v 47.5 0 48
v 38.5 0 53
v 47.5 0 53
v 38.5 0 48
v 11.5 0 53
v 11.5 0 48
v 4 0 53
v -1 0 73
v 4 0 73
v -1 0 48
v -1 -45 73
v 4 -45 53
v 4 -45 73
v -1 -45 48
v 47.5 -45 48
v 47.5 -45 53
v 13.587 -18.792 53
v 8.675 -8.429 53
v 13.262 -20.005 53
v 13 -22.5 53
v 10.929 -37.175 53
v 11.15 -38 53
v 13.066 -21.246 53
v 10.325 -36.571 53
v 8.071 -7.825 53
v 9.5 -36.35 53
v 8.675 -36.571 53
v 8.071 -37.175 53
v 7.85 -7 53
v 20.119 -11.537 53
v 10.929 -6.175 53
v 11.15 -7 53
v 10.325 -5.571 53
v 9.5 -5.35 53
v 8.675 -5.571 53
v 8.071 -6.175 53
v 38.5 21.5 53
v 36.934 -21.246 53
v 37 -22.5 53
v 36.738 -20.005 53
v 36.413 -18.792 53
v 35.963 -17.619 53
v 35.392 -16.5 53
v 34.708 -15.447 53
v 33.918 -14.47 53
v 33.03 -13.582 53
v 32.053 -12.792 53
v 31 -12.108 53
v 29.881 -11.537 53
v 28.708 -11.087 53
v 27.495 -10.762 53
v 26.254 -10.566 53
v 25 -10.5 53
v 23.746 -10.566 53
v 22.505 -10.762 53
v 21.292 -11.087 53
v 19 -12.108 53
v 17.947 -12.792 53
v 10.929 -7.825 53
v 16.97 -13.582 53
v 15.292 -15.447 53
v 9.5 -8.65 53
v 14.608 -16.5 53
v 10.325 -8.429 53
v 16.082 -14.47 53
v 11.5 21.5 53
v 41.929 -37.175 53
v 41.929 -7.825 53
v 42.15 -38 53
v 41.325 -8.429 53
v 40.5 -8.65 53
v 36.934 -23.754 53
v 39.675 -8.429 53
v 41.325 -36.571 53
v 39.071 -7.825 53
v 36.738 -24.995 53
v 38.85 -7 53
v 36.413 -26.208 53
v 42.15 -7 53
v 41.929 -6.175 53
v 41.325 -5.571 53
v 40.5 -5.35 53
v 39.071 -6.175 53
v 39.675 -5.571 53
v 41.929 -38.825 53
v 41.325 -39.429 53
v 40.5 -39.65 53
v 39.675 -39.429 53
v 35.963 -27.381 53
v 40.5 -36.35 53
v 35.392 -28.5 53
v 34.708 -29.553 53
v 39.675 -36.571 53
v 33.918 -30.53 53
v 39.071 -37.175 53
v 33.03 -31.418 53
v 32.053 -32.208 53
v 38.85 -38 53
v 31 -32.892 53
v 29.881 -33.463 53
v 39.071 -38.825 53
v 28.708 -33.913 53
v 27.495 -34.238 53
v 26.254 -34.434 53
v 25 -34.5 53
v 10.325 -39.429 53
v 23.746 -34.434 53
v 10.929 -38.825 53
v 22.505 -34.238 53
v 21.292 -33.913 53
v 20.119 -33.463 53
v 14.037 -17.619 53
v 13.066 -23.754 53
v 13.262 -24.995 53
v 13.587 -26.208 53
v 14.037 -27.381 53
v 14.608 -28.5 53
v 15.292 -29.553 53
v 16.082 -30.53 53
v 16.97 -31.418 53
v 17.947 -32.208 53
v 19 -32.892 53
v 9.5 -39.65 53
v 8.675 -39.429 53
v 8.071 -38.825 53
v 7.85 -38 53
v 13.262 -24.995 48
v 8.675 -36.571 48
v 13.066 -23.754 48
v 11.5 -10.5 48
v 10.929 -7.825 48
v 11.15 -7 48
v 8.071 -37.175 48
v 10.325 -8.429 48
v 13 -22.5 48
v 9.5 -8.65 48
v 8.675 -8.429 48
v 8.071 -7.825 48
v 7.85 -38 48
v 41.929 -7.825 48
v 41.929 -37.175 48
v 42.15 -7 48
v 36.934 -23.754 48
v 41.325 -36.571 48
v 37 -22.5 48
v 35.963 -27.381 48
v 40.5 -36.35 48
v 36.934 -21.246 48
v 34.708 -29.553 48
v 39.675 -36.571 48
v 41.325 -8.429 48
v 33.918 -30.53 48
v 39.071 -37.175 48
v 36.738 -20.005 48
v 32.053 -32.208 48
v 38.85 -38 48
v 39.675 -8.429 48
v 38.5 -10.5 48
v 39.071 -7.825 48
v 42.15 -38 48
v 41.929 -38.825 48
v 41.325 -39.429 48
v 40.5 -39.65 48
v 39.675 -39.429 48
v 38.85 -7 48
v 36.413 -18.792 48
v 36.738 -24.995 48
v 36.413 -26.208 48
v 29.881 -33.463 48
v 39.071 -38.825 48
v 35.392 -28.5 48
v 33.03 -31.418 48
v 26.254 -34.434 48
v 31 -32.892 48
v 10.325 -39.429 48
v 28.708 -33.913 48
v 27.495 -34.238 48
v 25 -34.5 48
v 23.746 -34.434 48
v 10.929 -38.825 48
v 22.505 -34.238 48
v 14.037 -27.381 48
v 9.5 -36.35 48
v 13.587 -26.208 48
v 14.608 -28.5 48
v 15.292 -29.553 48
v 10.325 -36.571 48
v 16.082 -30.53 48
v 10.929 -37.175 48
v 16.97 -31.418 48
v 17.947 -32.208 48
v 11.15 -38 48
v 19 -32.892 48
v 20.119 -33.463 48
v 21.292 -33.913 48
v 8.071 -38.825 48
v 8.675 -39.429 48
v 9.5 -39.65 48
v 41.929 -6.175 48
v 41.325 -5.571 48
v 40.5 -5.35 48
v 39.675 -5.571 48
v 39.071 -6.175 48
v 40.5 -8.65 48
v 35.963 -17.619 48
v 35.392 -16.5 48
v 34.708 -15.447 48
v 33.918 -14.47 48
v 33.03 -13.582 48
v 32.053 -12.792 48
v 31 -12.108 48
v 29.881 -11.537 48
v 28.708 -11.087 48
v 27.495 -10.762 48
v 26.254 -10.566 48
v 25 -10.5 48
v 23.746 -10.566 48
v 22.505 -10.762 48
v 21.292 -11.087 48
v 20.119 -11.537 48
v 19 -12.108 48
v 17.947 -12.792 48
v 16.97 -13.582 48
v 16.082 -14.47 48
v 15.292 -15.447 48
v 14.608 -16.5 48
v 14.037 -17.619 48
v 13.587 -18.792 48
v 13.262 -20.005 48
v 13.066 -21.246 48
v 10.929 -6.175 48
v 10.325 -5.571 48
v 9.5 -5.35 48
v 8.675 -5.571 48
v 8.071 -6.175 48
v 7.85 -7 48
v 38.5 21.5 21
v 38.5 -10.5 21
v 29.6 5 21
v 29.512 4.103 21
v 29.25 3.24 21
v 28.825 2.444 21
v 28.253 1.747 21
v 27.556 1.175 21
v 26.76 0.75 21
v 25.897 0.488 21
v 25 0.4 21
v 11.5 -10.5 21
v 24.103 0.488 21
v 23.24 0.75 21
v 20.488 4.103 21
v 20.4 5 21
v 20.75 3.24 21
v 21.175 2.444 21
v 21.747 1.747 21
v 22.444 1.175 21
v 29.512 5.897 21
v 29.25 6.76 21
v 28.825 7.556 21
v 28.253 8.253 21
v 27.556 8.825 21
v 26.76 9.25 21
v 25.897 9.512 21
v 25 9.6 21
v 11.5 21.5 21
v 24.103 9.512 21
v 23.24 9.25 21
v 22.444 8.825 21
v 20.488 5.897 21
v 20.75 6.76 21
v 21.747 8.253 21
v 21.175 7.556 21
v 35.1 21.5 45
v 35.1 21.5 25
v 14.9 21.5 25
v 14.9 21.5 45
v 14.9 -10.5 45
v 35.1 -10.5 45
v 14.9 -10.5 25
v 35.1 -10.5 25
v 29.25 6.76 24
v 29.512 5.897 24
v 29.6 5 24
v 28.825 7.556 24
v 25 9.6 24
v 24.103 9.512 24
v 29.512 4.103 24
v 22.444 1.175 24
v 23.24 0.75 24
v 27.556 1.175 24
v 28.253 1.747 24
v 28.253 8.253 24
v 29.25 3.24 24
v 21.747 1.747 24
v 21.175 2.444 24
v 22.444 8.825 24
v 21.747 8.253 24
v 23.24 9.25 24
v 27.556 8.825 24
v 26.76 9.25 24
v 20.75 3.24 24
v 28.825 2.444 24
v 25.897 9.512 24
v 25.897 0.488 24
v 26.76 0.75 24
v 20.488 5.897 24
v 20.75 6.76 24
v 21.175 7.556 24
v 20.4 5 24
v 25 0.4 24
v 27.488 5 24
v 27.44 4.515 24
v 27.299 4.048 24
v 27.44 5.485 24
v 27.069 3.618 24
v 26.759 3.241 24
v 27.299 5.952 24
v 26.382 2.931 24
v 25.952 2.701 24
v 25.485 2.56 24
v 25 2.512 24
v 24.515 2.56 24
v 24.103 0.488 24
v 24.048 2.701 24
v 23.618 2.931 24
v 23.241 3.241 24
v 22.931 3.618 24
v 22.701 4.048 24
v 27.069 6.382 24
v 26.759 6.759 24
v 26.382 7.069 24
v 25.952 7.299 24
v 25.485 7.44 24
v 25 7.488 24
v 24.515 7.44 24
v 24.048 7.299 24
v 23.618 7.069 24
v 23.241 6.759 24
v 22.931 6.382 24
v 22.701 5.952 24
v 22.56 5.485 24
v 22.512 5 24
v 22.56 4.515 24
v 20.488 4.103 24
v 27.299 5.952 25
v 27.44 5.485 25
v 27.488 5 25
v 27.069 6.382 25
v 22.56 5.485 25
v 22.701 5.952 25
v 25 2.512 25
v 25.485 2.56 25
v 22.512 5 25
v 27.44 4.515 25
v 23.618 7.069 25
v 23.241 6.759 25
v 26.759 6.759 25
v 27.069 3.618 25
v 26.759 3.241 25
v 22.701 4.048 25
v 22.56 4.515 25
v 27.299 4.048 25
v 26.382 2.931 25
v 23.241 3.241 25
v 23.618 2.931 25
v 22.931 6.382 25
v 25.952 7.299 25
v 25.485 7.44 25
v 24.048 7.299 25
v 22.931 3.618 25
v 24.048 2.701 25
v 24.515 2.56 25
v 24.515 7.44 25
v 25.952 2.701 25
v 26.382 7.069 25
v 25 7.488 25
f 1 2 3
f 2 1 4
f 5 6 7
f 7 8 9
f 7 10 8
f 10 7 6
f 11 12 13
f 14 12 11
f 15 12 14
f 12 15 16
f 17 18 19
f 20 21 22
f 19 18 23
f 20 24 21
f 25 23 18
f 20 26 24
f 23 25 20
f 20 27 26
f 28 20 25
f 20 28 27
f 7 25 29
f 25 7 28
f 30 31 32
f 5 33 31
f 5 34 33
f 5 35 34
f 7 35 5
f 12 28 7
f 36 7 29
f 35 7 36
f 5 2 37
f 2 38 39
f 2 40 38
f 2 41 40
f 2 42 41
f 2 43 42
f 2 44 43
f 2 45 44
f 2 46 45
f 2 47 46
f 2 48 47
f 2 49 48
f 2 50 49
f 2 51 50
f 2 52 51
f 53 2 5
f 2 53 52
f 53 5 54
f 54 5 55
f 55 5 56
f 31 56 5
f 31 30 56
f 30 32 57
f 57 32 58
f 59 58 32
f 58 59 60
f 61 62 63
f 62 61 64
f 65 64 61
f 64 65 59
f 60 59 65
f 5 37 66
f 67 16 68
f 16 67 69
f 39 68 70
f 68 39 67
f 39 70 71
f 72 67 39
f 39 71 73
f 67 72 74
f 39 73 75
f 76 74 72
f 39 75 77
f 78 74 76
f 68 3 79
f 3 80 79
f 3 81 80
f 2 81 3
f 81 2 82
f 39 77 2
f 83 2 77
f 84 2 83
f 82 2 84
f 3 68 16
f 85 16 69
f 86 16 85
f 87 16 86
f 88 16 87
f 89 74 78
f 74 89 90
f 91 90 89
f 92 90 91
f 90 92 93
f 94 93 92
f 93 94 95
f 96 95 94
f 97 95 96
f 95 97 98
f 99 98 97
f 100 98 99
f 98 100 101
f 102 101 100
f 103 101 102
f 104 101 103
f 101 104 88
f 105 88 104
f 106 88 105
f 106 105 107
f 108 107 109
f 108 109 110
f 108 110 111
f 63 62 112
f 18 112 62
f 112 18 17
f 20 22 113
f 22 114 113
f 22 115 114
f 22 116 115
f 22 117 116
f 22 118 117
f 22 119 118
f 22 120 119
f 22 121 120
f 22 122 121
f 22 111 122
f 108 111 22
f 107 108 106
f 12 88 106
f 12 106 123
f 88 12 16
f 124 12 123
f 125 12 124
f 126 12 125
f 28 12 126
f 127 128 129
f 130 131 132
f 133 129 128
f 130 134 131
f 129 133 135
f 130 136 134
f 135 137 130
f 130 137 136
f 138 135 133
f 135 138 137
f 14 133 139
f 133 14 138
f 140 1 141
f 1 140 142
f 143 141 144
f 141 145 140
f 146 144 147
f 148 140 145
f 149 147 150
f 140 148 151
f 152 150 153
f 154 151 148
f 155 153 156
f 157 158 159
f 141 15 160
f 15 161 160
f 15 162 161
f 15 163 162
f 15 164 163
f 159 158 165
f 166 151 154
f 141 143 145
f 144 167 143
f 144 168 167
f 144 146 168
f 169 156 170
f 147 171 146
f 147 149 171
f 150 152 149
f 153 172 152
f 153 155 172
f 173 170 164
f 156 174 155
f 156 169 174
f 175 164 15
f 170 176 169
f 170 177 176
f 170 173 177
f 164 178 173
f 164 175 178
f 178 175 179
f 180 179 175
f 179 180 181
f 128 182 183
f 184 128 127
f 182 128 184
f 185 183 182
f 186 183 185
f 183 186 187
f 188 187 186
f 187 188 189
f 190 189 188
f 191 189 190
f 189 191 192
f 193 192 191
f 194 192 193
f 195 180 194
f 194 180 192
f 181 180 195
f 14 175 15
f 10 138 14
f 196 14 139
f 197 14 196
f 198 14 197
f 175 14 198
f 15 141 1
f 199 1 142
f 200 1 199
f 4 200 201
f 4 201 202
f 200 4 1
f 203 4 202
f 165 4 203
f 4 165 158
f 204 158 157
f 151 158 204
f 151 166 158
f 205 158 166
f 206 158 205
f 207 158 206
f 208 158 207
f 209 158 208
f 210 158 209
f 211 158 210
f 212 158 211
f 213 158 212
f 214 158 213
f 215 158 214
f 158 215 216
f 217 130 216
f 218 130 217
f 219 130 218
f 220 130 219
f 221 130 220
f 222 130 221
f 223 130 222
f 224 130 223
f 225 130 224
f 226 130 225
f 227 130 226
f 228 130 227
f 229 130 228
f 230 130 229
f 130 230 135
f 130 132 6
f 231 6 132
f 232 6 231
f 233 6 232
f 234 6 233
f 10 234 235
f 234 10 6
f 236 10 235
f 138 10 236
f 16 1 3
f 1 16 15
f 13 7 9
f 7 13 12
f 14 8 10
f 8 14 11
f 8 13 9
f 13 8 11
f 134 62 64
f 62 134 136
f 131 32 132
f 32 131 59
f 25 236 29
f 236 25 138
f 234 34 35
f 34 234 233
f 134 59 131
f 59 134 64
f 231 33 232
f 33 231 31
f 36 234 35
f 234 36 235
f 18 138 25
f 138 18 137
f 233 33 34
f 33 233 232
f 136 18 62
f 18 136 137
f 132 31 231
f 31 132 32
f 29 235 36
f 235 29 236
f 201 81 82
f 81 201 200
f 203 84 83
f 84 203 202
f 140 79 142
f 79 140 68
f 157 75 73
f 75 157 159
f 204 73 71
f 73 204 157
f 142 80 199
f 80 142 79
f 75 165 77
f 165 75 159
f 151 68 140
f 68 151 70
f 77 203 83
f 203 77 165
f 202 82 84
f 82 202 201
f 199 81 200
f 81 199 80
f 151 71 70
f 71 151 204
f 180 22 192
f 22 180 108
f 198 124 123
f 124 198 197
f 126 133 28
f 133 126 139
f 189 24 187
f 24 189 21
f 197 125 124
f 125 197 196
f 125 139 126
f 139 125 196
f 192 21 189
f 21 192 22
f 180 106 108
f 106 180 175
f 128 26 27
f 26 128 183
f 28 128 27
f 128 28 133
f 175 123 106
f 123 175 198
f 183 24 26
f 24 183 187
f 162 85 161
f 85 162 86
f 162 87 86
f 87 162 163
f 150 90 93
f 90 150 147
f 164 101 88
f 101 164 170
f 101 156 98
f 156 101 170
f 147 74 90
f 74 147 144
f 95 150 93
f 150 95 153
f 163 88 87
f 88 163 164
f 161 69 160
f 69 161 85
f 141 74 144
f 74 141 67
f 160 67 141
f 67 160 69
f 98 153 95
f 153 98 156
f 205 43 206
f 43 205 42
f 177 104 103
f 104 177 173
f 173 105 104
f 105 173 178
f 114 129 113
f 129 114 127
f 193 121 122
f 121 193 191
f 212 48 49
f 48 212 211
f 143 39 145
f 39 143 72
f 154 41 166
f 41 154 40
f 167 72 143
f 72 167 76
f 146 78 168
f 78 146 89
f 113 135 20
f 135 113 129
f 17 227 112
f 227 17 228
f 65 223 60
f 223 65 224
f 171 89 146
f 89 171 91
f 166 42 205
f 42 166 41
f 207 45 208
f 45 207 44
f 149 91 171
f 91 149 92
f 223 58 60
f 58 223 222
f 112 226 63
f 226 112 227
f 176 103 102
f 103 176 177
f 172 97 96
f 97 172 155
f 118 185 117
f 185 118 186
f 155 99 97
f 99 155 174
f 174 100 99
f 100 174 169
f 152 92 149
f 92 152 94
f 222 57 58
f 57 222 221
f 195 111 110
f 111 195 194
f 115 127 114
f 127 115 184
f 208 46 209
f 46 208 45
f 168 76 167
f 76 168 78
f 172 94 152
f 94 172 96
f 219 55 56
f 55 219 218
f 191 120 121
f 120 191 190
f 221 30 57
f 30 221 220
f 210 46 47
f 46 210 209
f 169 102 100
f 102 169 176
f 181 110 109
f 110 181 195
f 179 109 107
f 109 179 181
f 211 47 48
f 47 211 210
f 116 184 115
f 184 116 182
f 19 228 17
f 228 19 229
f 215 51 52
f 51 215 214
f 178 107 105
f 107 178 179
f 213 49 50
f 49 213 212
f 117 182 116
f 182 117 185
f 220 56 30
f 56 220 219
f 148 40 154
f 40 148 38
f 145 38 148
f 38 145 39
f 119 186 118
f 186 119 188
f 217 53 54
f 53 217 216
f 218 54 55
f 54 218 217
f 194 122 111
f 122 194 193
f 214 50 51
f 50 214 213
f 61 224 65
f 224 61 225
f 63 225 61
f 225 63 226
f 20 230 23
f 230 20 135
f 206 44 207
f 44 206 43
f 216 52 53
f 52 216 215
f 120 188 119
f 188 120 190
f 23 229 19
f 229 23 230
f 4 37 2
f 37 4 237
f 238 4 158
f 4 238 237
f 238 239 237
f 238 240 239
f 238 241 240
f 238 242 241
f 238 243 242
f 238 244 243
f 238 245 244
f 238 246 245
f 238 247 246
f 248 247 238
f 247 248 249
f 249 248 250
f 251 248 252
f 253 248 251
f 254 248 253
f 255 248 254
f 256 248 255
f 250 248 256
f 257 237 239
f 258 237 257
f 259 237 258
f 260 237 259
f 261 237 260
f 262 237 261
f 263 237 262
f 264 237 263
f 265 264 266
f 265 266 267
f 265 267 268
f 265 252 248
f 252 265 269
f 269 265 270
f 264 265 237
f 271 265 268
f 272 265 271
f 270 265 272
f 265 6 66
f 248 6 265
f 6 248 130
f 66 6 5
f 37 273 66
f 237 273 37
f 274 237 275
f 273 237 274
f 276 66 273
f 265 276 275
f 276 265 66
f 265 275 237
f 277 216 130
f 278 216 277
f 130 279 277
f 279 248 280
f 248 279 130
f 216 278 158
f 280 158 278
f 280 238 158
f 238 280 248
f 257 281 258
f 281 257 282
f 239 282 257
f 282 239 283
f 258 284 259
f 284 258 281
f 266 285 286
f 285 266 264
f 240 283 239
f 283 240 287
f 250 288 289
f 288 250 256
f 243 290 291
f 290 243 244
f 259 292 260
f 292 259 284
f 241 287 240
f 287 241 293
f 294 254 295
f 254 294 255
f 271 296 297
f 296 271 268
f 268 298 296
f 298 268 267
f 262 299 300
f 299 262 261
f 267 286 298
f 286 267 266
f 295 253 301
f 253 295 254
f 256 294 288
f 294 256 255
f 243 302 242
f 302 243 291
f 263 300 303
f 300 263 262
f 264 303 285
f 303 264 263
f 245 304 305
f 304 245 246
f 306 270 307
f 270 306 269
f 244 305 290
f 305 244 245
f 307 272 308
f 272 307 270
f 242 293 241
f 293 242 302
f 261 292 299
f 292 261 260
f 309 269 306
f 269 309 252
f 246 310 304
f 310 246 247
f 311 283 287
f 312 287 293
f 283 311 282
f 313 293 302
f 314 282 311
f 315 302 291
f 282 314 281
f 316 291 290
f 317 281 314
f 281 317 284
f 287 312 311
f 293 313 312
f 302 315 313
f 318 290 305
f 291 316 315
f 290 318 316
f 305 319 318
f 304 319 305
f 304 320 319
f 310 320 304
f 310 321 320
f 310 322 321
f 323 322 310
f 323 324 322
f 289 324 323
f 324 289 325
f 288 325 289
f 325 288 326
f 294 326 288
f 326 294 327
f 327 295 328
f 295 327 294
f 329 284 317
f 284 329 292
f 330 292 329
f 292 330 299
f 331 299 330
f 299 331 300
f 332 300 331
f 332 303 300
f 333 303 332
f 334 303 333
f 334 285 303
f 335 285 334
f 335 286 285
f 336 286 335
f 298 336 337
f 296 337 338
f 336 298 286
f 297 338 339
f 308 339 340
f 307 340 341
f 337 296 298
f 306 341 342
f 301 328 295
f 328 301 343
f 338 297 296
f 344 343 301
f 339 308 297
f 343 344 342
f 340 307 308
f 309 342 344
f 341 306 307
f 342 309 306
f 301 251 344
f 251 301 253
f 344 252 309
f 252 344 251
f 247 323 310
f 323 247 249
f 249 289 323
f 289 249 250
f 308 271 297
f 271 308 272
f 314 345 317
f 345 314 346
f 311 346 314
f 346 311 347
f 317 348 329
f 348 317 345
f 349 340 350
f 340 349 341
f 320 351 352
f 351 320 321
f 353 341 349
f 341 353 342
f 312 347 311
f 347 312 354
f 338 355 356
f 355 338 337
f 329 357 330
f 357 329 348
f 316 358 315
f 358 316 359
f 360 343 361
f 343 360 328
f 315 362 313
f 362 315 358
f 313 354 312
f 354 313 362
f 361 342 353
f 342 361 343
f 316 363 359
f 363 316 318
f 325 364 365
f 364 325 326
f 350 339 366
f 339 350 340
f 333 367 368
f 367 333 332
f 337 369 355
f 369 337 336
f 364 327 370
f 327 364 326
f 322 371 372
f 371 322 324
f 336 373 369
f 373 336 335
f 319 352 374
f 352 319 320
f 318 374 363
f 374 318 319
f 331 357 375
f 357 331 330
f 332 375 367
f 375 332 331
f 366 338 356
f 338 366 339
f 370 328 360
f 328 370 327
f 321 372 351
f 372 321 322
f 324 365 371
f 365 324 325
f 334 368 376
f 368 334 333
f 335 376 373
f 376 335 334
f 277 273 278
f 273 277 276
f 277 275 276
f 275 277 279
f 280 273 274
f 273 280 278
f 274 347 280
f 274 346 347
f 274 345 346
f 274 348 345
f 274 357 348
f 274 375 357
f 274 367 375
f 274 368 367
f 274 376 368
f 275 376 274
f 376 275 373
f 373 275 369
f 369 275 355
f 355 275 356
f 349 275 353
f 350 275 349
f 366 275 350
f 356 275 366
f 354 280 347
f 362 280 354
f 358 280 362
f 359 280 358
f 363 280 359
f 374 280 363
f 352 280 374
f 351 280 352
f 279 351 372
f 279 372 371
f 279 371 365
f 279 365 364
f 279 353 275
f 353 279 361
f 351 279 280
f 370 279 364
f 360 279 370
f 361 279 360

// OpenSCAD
// file: MCAD/constants.scad
// MIT license


TAU = 6.2831853071; //2*PI, see http://tauday.com/
PI = TAU/2;

// translates a imperial measurement in inches to meters
mm_per_inch = 25.4;
// file: MCAD/math.scad
// MIT license

include <constants.scad>

function deg(angle) = 360*angle/TAU;
// file: MCAD/motors.scad
// Copyright 2010 D1plo1d

// This library is dual licensed under the GPL 3.0 and the GNU Lesser General Public License as per http://creativecommons.org/licenses/LGPL/2.1/ .

include <math.scad>


//generates a motor mount for the specified nema standard #.
module stepper_motor_mount(nema_standard,slide_distance=0, mochup=true, tolerance=0) {
	//dimensions from:
	// http://www.numberfactory.com/NEMA%20Motor%20Dimensions.htm
	if (nema_standard == 17)
	{
		_stepper_motor_mount(
			motor_shaft_diameter = 0.1968*mm_per_inch,
			motor_shaft_length = 0.945*mm_per_inch,
			pilot_diameter = 0.866*mm_per_inch,
			pilot_length = 0.80*mm_per_inch,
			mounting_bolt_circle = 1.725*mm_per_inch,
			bolt_hole_size = 3.5,
			bolt_hole_distance = 1.220*mm_per_inch,
			slide_distance = slide_distance,
			mochup = mochup,
			tolerance=tolerance);
	}
	if (nema_standard == 23)
	{
		_stepper_motor_mount(
			motor_shaft_diameter = 0.250*mm_per_inch,
			motor_shaft_length = 0.81*mm_per_inch,
			pilot_diameter = 1.500*mm_per_inch,
			pilot_length = 0.062*mm_per_inch,
			mounting_bolt_circle = 2.625*mm_per_inch,
			bolt_hole_size = 0.195*mm_per_inch,
			bolt_hole_distance = 1.856*mm_per_inch,
			slide_distance = slide_distance,
			mochup = mochup,
			tolerance=tolerance);
	}
	
}


//inner mehod for creating a stepper motor mount of any dimensions
module _stepper_motor_mount(
	motor_shaft_diameter,
	motor_shaft_length,
	pilot_diameter,
	pilot_length,
	mounting_bolt_circle,
	bolt_hole_size,
	bolt_hole_distance,
	slide_distance = 0,
	motor_length = 40, //arbitray - not standardized
	mochup,
	tolerance = 0
)
{
	union()
	{
	// == centered mount points ==
	//mounting circle inset
	translate([0,slide_distance/2,0]) circle(r = pilot_diameter/2 + tolerance);
	square([pilot_diameter,slide_distance],center=true);
	translate([0,-slide_distance/2,0]) circle(r = pilot_diameter/2 + tolerance);

	//todo: motor shaft hole
	
	//mounting screw holes
	for (x = [-1,1])
	{
		for (y = [-1,1])
		{
			translate([x*bolt_hole_distance/2,y*bolt_hole_distance/2,0])
			{
				translate([0,slide_distance/2,0]) circle(bolt_hole_size/2 + tolerance);
				translate([0,-slide_distance/2,0]) circle(bolt_hole_size/2 + tolerance);
				square([bolt_hole_size+2*tolerance,slide_distance],center=true);
			}
		}
	}
	// == motor mock-up ==
	//motor box
	if (mochup == true)
	{
		%translate([0,0,-5]) cylinder(h = 5, r = pilot_diameter/2);
		%translate(v=[0,0,-motor_length/2])
		{
			cube(size=[bolt_hole_distance+bolt_hole_size+5,bolt_hole_distance+bolt_hole_size+5,motor_length], center = true);
		}
		//shaft
		%translate(v=[0,0,-(motor_length-motor_shaft_length-2)/2])
		{
			%cylinder(r=motor_shaft_diameter/2,h=motor_length+motor_shaft_length--1, center = true);
		}
	}
	}
}
// file: triangle.scad
//Copyright Austin Floyd 2013
//http://www.thingiverse.com/thing:119050
//license GNU GPL
//austin.floyd at 3DprintGeeks (dot) com

//global variables.. if not set when calling wedge it will use these values. 
//The prefix st_ is to "namespace" the global variables so they're not accidentally overridden elsewhere


//The top angle of the right triangle
st_wedgeAngle=12; // [0.01:89.99]

//The height of the triangle (width auto-generated based on this)
st_wedgeHeight=27; // [0.01:200]

//Depth (thickness) of triangle
st_wedgeWidth=2.2; // [0.01:200]

//Increased or decreased percentage (50% would be 0.5) of top point vs bottom point
st_topFactor=0.5; // [0,0.1,0.2,0.3,0.4,0.5,0.6,0.7,0.8,0.9,1]

//Whether or not to center on x/y/z
st_center=false; // [true, false]

//Flip it upside down
st_invert=false; // [true, false]

//default wedge
//wedge();

//demo of several different wedges
demo();

module demo() {
	translate([0,0,15])
	wedge(angle=75,height=10, wedgeWidth=5);

	wedge(angle=75,height=5,topFactor=.25, center=true, wedgeWidth=10);

	translate([0,0,-15])
	wedge(angle=35,height=13,center=true);

	translate([0,0,-30])
	wedge(angle=35,height=6, center=true, invert=true);
}


module wedge(angle=st_wedgeAngle, height=st_wedgeHeight, wedgeWidth=st_wedgeWidth, topFactor=st_topFactor, center=st_center, invert=st_invert) {
	angle2=180-90-angle;
	hyp=height/sin(angle2);
	width=sqrt(pow(hyp,2)-pow(height,2));
	if (!invert) {
		triangle(height, width, center, topFactor, wedgeWidth);
	}
	if (invert) {
		rotate(180,[1,0,0])
		triangle(height, width, center, topFactor, wedgeWidth);
	}
}
module triangle(height=5, width=5, center=false, topFactor=0.5, wedgeWidth) {
	triangles=[[0,1,4],[5,4,1],		// top
					[1,2,5],[2,3,4],		// sides
					[3,0,4], [4,5,2],	//back
           	[2,1,0], [2,0,3]]; // base
	halfWidth=width/2;
	halfWWidth=wedgeWidth/2;
	topWidth=wedgeWidth*topFactor;
	halfTopWidth=topWidth/2;
	topHalfDiff=(wedgeWidth-topWidth)/2;
	halfHeight=height/2;
	if (center) {
		polyhedron(
  			points=[/*0*/[halfWidth,halfWWidth,-halfHeight],/*1*/[halfWidth,-halfWWidth,-halfHeight],				//front point
					  /*2*/[-halfWidth,-halfWWidth,-halfHeight],       /*3*/[-halfWidth,halfWWidth,-halfHeight], //rear point
           	  /*4*/[-halfWidth,halfTopWidth,height-halfHeight], /*5*/[-halfWidth,-halfTopWidth,height-halfHeight] ], //front/rear top 
  			triangles=triangles
		);
	}
	else {
		polyhedron(
  			points=[/*0*/[width,wedgeWidth,0],         			 /*1*/[width,0,0],				    ////front point
					  /*2*/[0,0,0],       					  			 /*3*/[0,wedgeWidth,0], 		    //rear point
           	  /*4*/[0,wedgeWidth-topHalfDiff,height],/*5*/[0,topHalfDiff,height] ],//front/back top 
  			triangles=triangles
		);
	}
}
// file: pulley.scad
use <MCAD/nuts_and_bolts.scad>;

module pulley_wall(xside)
{
   hull(){
       translate([0,0,0]) cube([20,3,2]);
       translate([8.5,0,18]) cube([3,3,2]);
       if (xside==0){
          translate([8.5,7,0]) cube([1,1,1]);
          translate([10,4,9]) rotate([90,0,0]) cylinder(r=3,h=10);
          
         } else {
          translate([8.5,-5,0]) cube([1,1,1]);
          translate([10,8,9]) rotate([90,0,0]) cylinder(r=3,h=10);
         }
       }
    
}

module pulley_body()
{
    translate([0,0,0])   pulley_wall(1);
    translate([0,22,0])  pulley_wall(0);
    %translate([10,-2,9]) rotate([90,0,180]) boltHole(3,length=28);
    %translate([10,27,9]) rotate([90,0,180]) nutHole(3); 
}

module pulley_cuts()
{
    translate([10,-2,9]) rotate([90,0,180]) boltHole(3,length=28);
    translate([10,25,9]) rotate([90,0,180]) nutHole(3);  
    translate([10,27,9]) rotate([90,0,180]) nutHole(3); 
}

module pulley()
{
	difference(){
        translate([23,21,-12]) rotate([90,0,270]) pulley_body();
        translate([23,21,-12]) rotate([90,0,270]) pulley_cuts();
        }
    

}



pulley();
// file: sensor.scad
module sensor_mount_body()
{
 union() { 
      translate([44,2,0]) rotate([90,0,0]) cube([10,15,4]); 
      translate([44,18,0]) rotate([90,0,0]) cube([10,15,4]);
      
      translate([50,-2,0]) rotate([90,0,90]) cube([20,15,4]);
    //  translate([0,-2,0]) rotate([90,0,90]) cube([20,15,4]);
      
      
      }
}

module sensor_mount_cuts()
{

      translate([50,7.5,7.5]) rotate([90, 0, 90]) cylinder(r=2.5, h=10, center=true, $fn=12);

}

module sensor_mount()
{
   difference() {
    sensor_mount_body();
    sensor_mount_cuts();
    
     
     }
}

sensor_mount();
// file: nemamount.scad
include <MCAD/units.scad>;
include <MCAD/materials.scad>
include <MCAD/stepper.scad>
include <MCAD/motors.scad>
use <MCAD/shapes.scad>;
use <pulley.scad>;
$fn = 32;




module motor_support(ht)
{
   difference(){
	  translate([-22.5,23.5,0]) rotate([90,0,0]) motor_support_body(ht);
      translate([0,1,0]) rotate([90,0,0]) motor_support_cuts(ht);
      }
}

module motor_support_body(ht)
{
	cube([45,ht,48.5]);

}


module motor_support_cuts(ht)
{
// Motor shaft/pulley cutout.
      translate([0,.1,0]) rotate([90, 0, 0]) cylinder(r=12, h=ht*2, center=true, $fn=60);
      // NEMA 17 stepper motor mounting screws.
      for (x = [-1, 1]) for (z = [-1, 1]) {
        scale([x, 1, z]) translate([15.5, .1, 15.5]) {
          rotate([90, 0, 0]) cylinder(r=4, h=ht*2, center=true, $fn=12);
          }
        }
}



module nema_geared_cutout()
{
    //pulley opening
    translate([16,1,21]) rotate([90,0,0]){
      cylinder (h=22, r=6.6);

      rotate([0,0,45]) {
        translate([14,0,0]) cylinder(h=22, r=1.6, $fn=12);
        translate([0,14,0]) cylinder(h=22, r=1.6, $fn=12);
        translate([-14,0,0]) cylinder(h=22, r=1.6, $fn=12);
        translate([0,-14,0]) cylinder(h=22, r=1.6, $fn=12);
      }
     
    }

    //gearhead indentation
    translate([16,-5,21]) rotate([90,0,0]) cylinder (h=3.35, r=11.25);

  
    
}

module nema_cutout()
{
// Motor shaft/pulley cutout.
      rotate([90, 0, 0]) cylinder(r=12, h=20, center=true, $fn=60);
      // NEMA 17 stepper motor mounting screws.
      for (x = [-1, 1]) for (z = [-1, 1]) {
        scale([x, 1, z]) translate([15.5, -5, 15.5]) {
          rotate([90, 0, 0]) cylinder(r=1.65, h=20, center=true, $fn=12);
          }
        }
}

module nema_motor()
{
   union(){
     nema_mount();
     %translate([0,-4,1]) rotate([90,0,0]) motor(Nema17, size=NemaLong , dualAxis=false);
     }
}

module nema_motor_inverse()
{
   union(){
     nema_mount_inverse();
     %translate([0,-4,1]) rotate([90,0,0]) motor(Nema17, size=NemaLong , dualAxis=false);
     }
}

module nema_geared_motor_inverse()
{
   union(){
     nema_geared_inverse();
     %translate([16,-7,22]) rotate([90,0,180]) motor(Nema17, NemaLong, dualAxis=false);
    
     }
}

module nema_geared_motor()
{
   union(){
     nema_geared_mount();
     %translate([16,-7,22]) rotate([90,0,180]) motor(Nema17, NemaLong, dualAxis=false);
    
     }
}

module nema_geared_mount()
{
   difference(){
      union(){
           translate([-6,-6,0]) rotate([90,0,0]) cube([45,45,7]);
           translate([-6,-13,-4]) rotate([0,0,0]) cube([45,25,5]);
           translate([-6,-13,44]) rotate([0,0,0]) cube([45,25,5]);
           }
      translate([0,0,1]) nema_geared_cutout();
      }


}

module nema_geared_inverse()
{
   difference(){
      union(){
           translate([-6,-6,0]) rotate([90,0,0]) cube([45,45,7]);
           translate([-6,-31,-4]) rotate([0,0,0]) cube([45,25,5]);
           translate([-6,-31,44]) rotate([0,0,0]) cube([45,25,5]);
           }
      translate([0,0,1]) nema_geared_cutout();
      }


}

module nema_mount_inverse()
{
   difference(){
      union(){
        translate([-22.5,0,-21.5]) rotate([90,0,0]) cube([45,45,5]);
        translate([-22.5,-5,-25]) rotate([0,0,0]) cube([45,25,5]);
        }
      translate([0,0,1]) nema_cutout();
      }
   //nema_cutout();
}

module nema_mount()
{
   difference(){
      union(){
        translate([-22.5,0,-21.5]) rotate([90,0,0]) cube([45,45,5]);
        translate([-22.5,-25,-25]) rotate([0,0,0]) cube([45,25,5]);
        }
      translate([0,0,1]) nema_cutout();
      }
   //nema_cutout();
}

module pulley_mount()
{
   
        translate([-22.5,0,-21.5]) rotate([90,0,0]) cube([45,45,5]);
        translate([-22.5,-25,-25]) rotate([0,0,0]) cube([45,25,5]);
	translate([0,5,0]) rotate([90,0,0]) cylinder(r=18,h=5);
	translate([-11.25,28,0]) rotate([0,0,-90]) pulley();     
}

//nema_motor_inverse();
translate([0,0,40]) rotate([270,0,0]) pulley_mount();
//translate([0,0,0]) motor_support(40);
//nema_geared_motor();
//nema_geared_motor_inverse();
// file: vslot.scad
include <MCAD/units.scad>;
include <MCAD/materials.scad>
use <MCAD/shapes.scad>;
use <bom.scad>;

vslot_color_black = [0.27, 0.27, 0.3];
vslot_color = Aluminum;

module vslot(length=50, sections=1, finish, cutout=0) {
	size = sections * 20;
	bom(str("vslot20x", size, "x", length), str("v-slot 20x", size, " (", length , "mm)"), ["rail", "extrusion", "structure"]);
	cutext = [[12.00,4.50],[10.00,4.50],[8.20,2.78],[8.20,5.50],[6.56,5.50],[3.90,2.84],[3.90,0.21],[3.69,0.00],[3.90,-0.21],[3.90,-2.84],[6.56,-5.50],[8.20,-5.50],[8.20,-2.78],[10.00,-4.50],[12.00,-4.50]];
	cutint = [[16.10,0.21],[16.10,2.84],[12.70,6.24],[12.70,8.78],[7.30,8.78],[7.30,6.24],[3.90,2.84],[3.90,0.21],[3.69,0.00],[3.90,-0.21],[3.90,-2.84],[7.30,-6.24],[7.30,-8.78],[12.70,-8.78],[12.70,-6.24],[16.10,-2.84],[16.10,-0.21],[16.31,0.00],];
	cutcorner = [[8.20,8.20],[6.57,8.20],[6.57,7.66],[7.66,6.57],[8.20,6.57]];

	module profile() {
        
		difference() {
         
			translate([0,0,length/2])
			roundedBox(20 * sections, 20, length, 1.5);
         if (cutout == 0){
			for(i = [0,180]) rotate([0,0,-i]) translate([10 * (sections - 1), 0, -epsilon/2]) {
				linear_extrude(length+20) polygon(cutext);
				translate([5,-2.89,-20]) cube([10,5.78,length+40]);
			}
          
			for(i = [90,270]) rotate([0,0,-i])
				for(j = [0:sections-1]) translate([0, (sections - 1) * 10 - 20 * j, -epsilon/2]) {
					linear_extrude(length+epsilon) polygon(cutext);
					translate([5,-2.89,-20]) cube([10,5.78,length+40]);
				}

			for(i = [0:sections-1]) translate([i * 20 - 10 * (sections - 1),0,-epsilon/2])
				cylinder(length+20, 2.1, 2.1);

			for(i = [90,270]) rotate([0,0,-i])
				translate([0,(sections - 1) * 10,-epsilon/2])
				linear_extrude(length+epsilon) polygon(cutcorner);
			for(i = [ 0,180]) rotate([0,0,-i])
				translate([(sections - 1) * 10,0,-epsilon/2])
				linear_extrude(length+epsilon) polygon(cutcorner);

			if(sections > 1)
				for(i = [0:sections-2]) translate([(sections - 3) * 10 - i * 20, 0, -epsilon/2])
					linear_extrude(length+epsilon) polygon(cutint);
                      }
		}
	}

      if (cutout == 1){
		 translate([0,0,length/2]) box(20 * sections, 20.2, length);
          } else {
	     if(finish)
		   color(finish) profile();
	     else
		   color(vslot_color) profile();
         }
}

module vslot20x20(length, finish) { vslot(length, 1, finish); }
module vslot20x20_cutout(length, finish) { vslot(length, 1, finish, 1); }


module vslot20x40(length, finish) { vslot(length, 2, finish); }
module vslot20x40_cutout(length, finish) { vslot(length, 2, finish, 1); }

module vslot20x60(length, finish) { vslot(length, 3, finish); }
module vslot20x60_cutout(length, finish) { vslot(length, 3, finish, 1); }

module vslot20x80(length, finish) { vslot(length, 4, finish); }
module vslot20x80_cutout(length, finish) { vslot(length, 4, finish, 1); }


module vslot_test() {
	$fn = 32;

	vslot20x20(100);

	translate([0, 40, 0])
	vslot20x40(100, vslot_color_black);

	translate([0, 80, 0])
	vslot20x60(100);

	translate([0, 120, 0])
	vslot20x80(100, vslot_color_black);

    translate([0,140,0]) vslot20x20_cutout(100);
}

vslot_test();
// file: bom.scad
module bom(code, desc, category) {
	echo(str("BOM: ",code," - ", desc, "; ", category));
}
// file: MCAD/nuts_and_bolts.scad
// Copyright 2010 D1plo1d

// This library is dual licensed under the GPL 3.0 and the GNU Lesser General Public License as per http://creativecommons.org/licenses/LGPL/2.1/ .

//testNutsAndBolts();

module SKIPtestNutsAndBolts()
{
	$fn = 360;
	translate([0,15])nutHole(3, proj=2);
	boltHole(3, length= 30, proj=2);
}

MM = "mm";
INCH = "inch"; //Not yet supported

//Based on: http://www.roymech.co.uk/Useful_Tables/Screws/Hex_Screws.htm
METRIC_NUT_AC_WIDTHS =
[
	-1, //0 index is not used but reduces computation
	-1,
	-1,
	6.40,//m3
	8.10,//m4
	9.20,//m5
	11.50,//m6
	-1,
	15.00,//m8
	-1,
	19.60,//m10
	-1,
	22.10,//m12
	-1,
	-1,
	-1,
	27.70,//m16
	-1,
	-1,
	-1,
	34.60,//m20
	-1,
	-1,
	-1,
	41.60,//m24
	-1,
	-1,
	-1,
	-1,
	-1,
	53.1,//m30
	-1,
	-1,
	-1,
	-1,
	-1,
	63.5//m36
];
METRIC_NUT_THICKNESS =
[
	-1, //0 index is not used but reduces computation
	-1,
	-1,
	2.40,//m3
	3.20,//m4
	4.00,//m5
	5.00,//m6
	-1,
	6.50,//m8
	-1,
	8.00,//m10
	-1,
	10.00,//m12
	-1,
	-1,
	-1,
	13.00,//m16
	-1,
	-1,
	-1,
	16.00//m20
	-1,
	-1,
	-1,
	19.00,//m24
	-1,
	-1,
	-1,
	-1,
	-1,
	24.00,//m30
	-1,
	-1,
	-1,
	-1,
	-1,
	29.00//m36
];

COURSE_METRIC_BOLT_MAJOR_THREAD_DIAMETERS =
[//based on max values
	-1, //0 index is not used but reduces computation
	-1,
	-1,
	2.98,//m3
	3.978,//m4
	4.976,//m5
	5.974,//m6
	-1,
	7.972,//m8
	-1,
	9.968,//m10
	-1,
	11.966,//m12
	-1,
	-1,
	-1,
	15.962,//m16
	-1,
	-1,
	-1,
	19.958,//m20
	-1,
	-1,
	-1,
	23.952,//m24
	-1,
	-1,
	-1,
	-1,
	-1,
	29.947,//m30
	-1,
	-1,
	-1,
	-1,
	-1,
	35.940//m36
];

module nutHole(size, units=MM, tolerance = +0.0001, proj = -1)
{
	//takes a metric screw/nut size and looksup nut dimensions
	radius = METRIC_NUT_AC_WIDTHS[size]/2+tolerance;
	height = METRIC_NUT_THICKNESS[size]+tolerance;
	if (proj == -1)
	{
		cylinder(r= radius, h=height, $fn = 6, center=[0,0]);
	}
	if (proj == 1)
	{
		circle(r= radius, $fn = 6);
	}
	if (proj == 2)
	{
		translate([-radius/2, 0])
			square([radius*2, height]);
	}
}

module boltHole(size, units=MM, length, tolerance = +0.0001, proj = -1)
{
	radius = COURSE_METRIC_BOLT_MAJOR_THREAD_DIAMETERS[size]/2+tolerance;
//TODO: proper screw cap values
	capHeight = METRIC_NUT_THICKNESS[size]+tolerance; //METRIC_BOLT_CAP_HEIGHTS[size]+tolerance;
	capRadius = METRIC_NUT_AC_WIDTHS[size]/2+tolerance; //METRIC_BOLT_CAP_RADIUS[size]+tolerance;

	if (proj == -1)
	{
	translate([0, 0, -capHeight])
		cylinder(r= capRadius, h=capHeight);
	cylinder(r = radius, h = length);
	}
	if (proj == 1)
	{
		circle(r = radius);
	}
	if (proj == 2)
	{
		translate([-capRadius/2, -capHeight])
			square([capRadius*2, capHeight]);
		square([radius*2, length]);
	}
}
// file: MCAD/shapes.scad
/*
 *  OpenSCAD Shapes Library (www.openscad.org)
 *  Copyright (C) 2009  Catarina Mota
 *  Copyright (C) 2010  Elmo Mäntynen
 *
 *  License: LGPL 2.1 or later
*/

// 2D Shapes
//ngon(sides, radius, center=false);

// 3D Shapes
//box(width, height, depth);
//roundedBox(width, height, depth, factor);
//cone(height, radius);
//ellipticalCylinder(width, height, depth);
//ellipsoid(width, height);
//tube(height, radius, wall, center = false);
//tube2(height, ID, OD, center = false);
//ovalTube(width, height, depth, wall, center = false);
//hexagon(height, depth);
//octagon(height, depth);
//dodecagon(height, depth);
//hexagram(height, depth);
//rightTriangle(adjacent, opposite, depth);
//equiTriangle(side, depth);
//12ptStar(height, depth);

//----------------------

// size is a vector [w, h, d]
module box(width, height, depth) {
  cube([width, height, depth], true);
}

// size is a vector [w, h, d]
module roundedBox(width, height, depth, radius) {
  size=[width, height, depth];
  cube(size - [2*radius,0,0], true);
  cube(size - [0,2*radius,0], true);
  for (x = [radius-size[0]/2, -radius+size[0]/2],
       y = [radius-size[1]/2, -radius+size[1]/2]) {
    translate([x,y,0]) cylinder(r=radius, h=size[2], center=true);
  }
}

module cone(height, radius, center = false) {
  cylinder(height, radius, 0, center);
}

module ellipticalCylinder(w,h, height, center = false) {
  scale([1, h/w, 1]) cylinder(h=height, r=w, center=center);
}

module ellipsoid(w, h, center = false) {
  scale([1, h/w, 1]) sphere(r=w/2, center=center);
}

// wall is wall thickness
module tube(height, radius, wall, center = false) {
  difference() {
    cylinder(h=height, r=radius, center=center);
    cylinder(h=height, r=radius-wall, center=center);
  }
}

// wall is wall thickness
module tube2(height, ID, OD, center = false) {
  difference() {
    cylinder(h=height, r=OD/2, center=center);
    cylinder(h=height, r=ID/2, center=center);
  }
}

// wall is wall thickness
module ovalTube(height, rx, ry, wall, center = false) {
  difference() {
    scale([1, ry/rx, 1]) cylinder(h=height, r=rx, center=center);
    scale([(rx-wall)/rx, (ry-wall)/rx, 1]) cylinder(h=height, r=rx, center=center);
  }
}

// size is the XY plane size, height in Z
module hexagon(size, height) {
  boxWidth = size/1.75;
  for (r = [-60, 0, 60]) rotate([0,0,r]) cube([boxWidth, size, height], true);
}

// size is the XY plane size, height in Z
module octagon(size, height) {
  intersection() {
    cube([size, size, height], true);
    rotate([0,0,45]) cube([size, size, height], true);
  }
}

// size is the XY plane size, height in Z
module dodecagon(size, height) {
  intersection() {
    hexagon(size, height);
    rotate([0,0,90]) hexagon(size, height);
  }
}

// size is the XY plane size, height in Z
module hexagram(size, height) {
  boxWidth=size/1.75;
  for (v = [[0,1],[0,-1],[1,-1]]) {
    intersection() {
      rotate([0,0,60*v[0]]) cube([size, boxWidth, height], true);
      rotate([0,0,60*v[1]]) cube([size, boxWidth, height], true);
    }
  }
}

module rightTriangle(adjacent, opposite, height) {
  difference() {
    translate([-adjacent/2,opposite/2,0]) cube([adjacent, opposite, height], true);
    translate([-adjacent,0,0]) {
      rotate([0,0,atan(opposite/adjacent)]) dislocateBox(adjacent*2, opposite, height+2);
    }
  }
}

module equiTriangle(side, height) {
  difference() {
    translate([-side/2,side/2,0]) cube([side, side, height], true);
    rotate([0,0,30]) dislocateBox(side*2, side, height);
    translate([-side,0,0]) {
      rotate([0,0,60]) dislocateBox(side*2, side, height);
    }
  }
}

module 12ptStar(size, height) {
  starNum = 3;
  starAngle = 360/starNum;
  for (s = [1:starNum]) {
    rotate([0, 0, s*starAngle]) cube([size, size, height], true);
  }
}

//-----------------------
//MOVES THE ROTATION AXIS OF A BOX FROM ITS CENTER TO THE BOTTOM LEFT CORNER
module dislocateBox(w, h, d) {
  translate([0,0,-d/2]) cube([w,h,d]);
}

//-----------------------
// Tests
//module test2D_ellipse(){ellipse(10, 5);}
module test_ellipsoid(){ellipsoid(10, 5);}

//module test2D_egg_outline(){egg_outline();}
// file: MCAD/boxes.scad
// Library: boxes.scad
// Version: 1.0
// Author: Marius Kintel
// Copyright: 2010
// License: BSD

// roundedBox([width, height, depth], float radius, bool sidesonly);

// EXAMPLE USAGE:
// roundedBox([20, 30, 40], 5, true);

// size is a vector [w, h, d]
module roundedBox(size, radius, sidesonly)
{
  rot = [ [0,0,0], [90,0,90], [90,90,0] ];
  if (sidesonly) {
    cube(size - [2*radius,0,0], true);
    cube(size - [0,2*radius,0], true);
    for (x = [radius-size[0]/2, -radius+size[0]/2],
           y = [radius-size[1]/2, -radius+size[1]/2]) {
      translate([x,y,0]) cylinder(r=radius, h=size[2], center=true);
    }
  }
  else {
    cube([size[0], size[1]-radius*2, size[2]-radius*2], center=true);
    cube([size[0]-radius*2, size[1], size[2]-radius*2], center=true);
    cube([size[0]-radius*2, size[1]-radius*2, size[2]], center=true);

    for (axis = [0:2]) {
      for (x = [radius-size[axis]/2, -radius+size[axis]/2],
             y = [radius-size[(axis+1)%3]/2, -radius+size[(axis+1)%3]/2]) {
        rotate(rot[axis])
          translate([x,y,0])
          cylinder(h=size[(axis+2)%3]-2*radius, r=radius, center=true);
      }
    }
    for (x = [radius-size[0]/2, -radius+size[0]/2],
           y = [radius-size[1]/2, -radius+size[1]/2],
           z = [radius-size[2]/2, -radius+size[2]/2]) {
      translate([x,y,z]) sphere(radius);
    }
  }
}
// file: MCAD/materials.scad
/*
 * Material colors.
 * 
 * Originally by Hans Häggström, 2010.
 * Dual licenced under Creative Commons Attribution-Share Alike 3.0 and LGPL2 or later
 */

// Material colors
Oak = [0.65, 0.5, 0.4];
Pine = [0.85, 0.7, 0.45];
Birch = [0.9, 0.8, 0.6];
FiberBoard = [0.7, 0.67, 0.6];
BlackPaint = [0.2, 0.2, 0.2];
Iron = [0.36, 0.33, 0.33];
Steel = [0.65, 0.67, 0.72];
Stainless = [0.45, 0.43, 0.5];
Aluminum = [0.77, 0.77, 0.8];
Brass = [0.88, 0.78, 0.5];
Transparent = [1, 1, 1, 0.2];

// Example, uncomment to view
//color_demo();

module color_demo(){
    // Wood
    colorTest(Oak, 0, 0);
    colorTest(Pine, 1, 0);
    colorTest(Birch, 2, 0);

    // Metals
    colorTest(Iron, 0, 1);
    colorTest(Steel, 1, 1);
    colorTest(Stainless, 2, 1);
    colorTest(Aluminum, 3, 1);

    // Mixboards
    colorTest(FiberBoard, 0, 2);

    // Paints
    colorTest(BlackPaint, 0, 3);
}

module colorTest(col, row=0, c=0) {
  color(col) translate([row * 30,c*30,0]) sphere(r=10);
}
// file: MCAD/units.scad
/*
 * Basic units.
 * 
 * Originally by Hans Häggström, 2010.
 * Dual licenced under Creative Commons Attribution-Share Alike 3.0 and LGPL2 or later
 */


mm = 1;
cm = 10 * mm;
dm = 100 * mm;
m = 1000 * mm;

inch = 25.4 * mm;

X = [1, 0, 0];
Y = [0, 1, 0];
Z = [0, 0, 1];

M3 = 3*mm;
M4 = 4*mm;
M5 = 5*mm;
M6 = 6*mm;
M8 = 8*mm;


// When a small distance is needed to overlap shapes for boolean cutting, etc.
epsilon = 0.01*mm;
// main file
include <MCAD/units.scad>;
include <MCAD/materials.scad>
include <MCAD/boxes.scad>;
use <MCAD/shapes.scad>;
use <MCAD/nuts_and_bolts.scad>;
use <bom.scad>;
use <vslot.scad>;
use <nemamount.scad>;
use <sensor.scad>;
use <pulley.scad>;
use <triangle.scad>;

$fn = 32;

rod_length = 500;



module motor_mounts()
{
      
    
      translate([24,-22.5,48]) rotate([270,0,90+180]) nema_motor();  
  
	
	
	
}


module vslot_cuts()
{
   
   
   translate([25,-30,35]) rotate([0,90,90]) vslot20x20_cutout(110);
 	
	
	
}

module show_rods()
{  
   %translate([25,-1,35]) rotate([0,90,90]) vslot20x20(rod_length);
   %translate([25,5,24]) boltHole(5, length=12);


  
   

}

module mini_body()
{
	motor_mounts();	
        translate([11.5,-10.5,20+1]) cube([27,32,30+2]); // X mount vslot
	
}

module mini_cuts()
{
	vslot_cuts();
	translate([25,5,24]) boltHole(5, length=12);
}

module mini_corner()
{   
   difference(){
	   mini_body();
           mini_cuts();
           }
   show_rods();
   
}

mini_corner();
